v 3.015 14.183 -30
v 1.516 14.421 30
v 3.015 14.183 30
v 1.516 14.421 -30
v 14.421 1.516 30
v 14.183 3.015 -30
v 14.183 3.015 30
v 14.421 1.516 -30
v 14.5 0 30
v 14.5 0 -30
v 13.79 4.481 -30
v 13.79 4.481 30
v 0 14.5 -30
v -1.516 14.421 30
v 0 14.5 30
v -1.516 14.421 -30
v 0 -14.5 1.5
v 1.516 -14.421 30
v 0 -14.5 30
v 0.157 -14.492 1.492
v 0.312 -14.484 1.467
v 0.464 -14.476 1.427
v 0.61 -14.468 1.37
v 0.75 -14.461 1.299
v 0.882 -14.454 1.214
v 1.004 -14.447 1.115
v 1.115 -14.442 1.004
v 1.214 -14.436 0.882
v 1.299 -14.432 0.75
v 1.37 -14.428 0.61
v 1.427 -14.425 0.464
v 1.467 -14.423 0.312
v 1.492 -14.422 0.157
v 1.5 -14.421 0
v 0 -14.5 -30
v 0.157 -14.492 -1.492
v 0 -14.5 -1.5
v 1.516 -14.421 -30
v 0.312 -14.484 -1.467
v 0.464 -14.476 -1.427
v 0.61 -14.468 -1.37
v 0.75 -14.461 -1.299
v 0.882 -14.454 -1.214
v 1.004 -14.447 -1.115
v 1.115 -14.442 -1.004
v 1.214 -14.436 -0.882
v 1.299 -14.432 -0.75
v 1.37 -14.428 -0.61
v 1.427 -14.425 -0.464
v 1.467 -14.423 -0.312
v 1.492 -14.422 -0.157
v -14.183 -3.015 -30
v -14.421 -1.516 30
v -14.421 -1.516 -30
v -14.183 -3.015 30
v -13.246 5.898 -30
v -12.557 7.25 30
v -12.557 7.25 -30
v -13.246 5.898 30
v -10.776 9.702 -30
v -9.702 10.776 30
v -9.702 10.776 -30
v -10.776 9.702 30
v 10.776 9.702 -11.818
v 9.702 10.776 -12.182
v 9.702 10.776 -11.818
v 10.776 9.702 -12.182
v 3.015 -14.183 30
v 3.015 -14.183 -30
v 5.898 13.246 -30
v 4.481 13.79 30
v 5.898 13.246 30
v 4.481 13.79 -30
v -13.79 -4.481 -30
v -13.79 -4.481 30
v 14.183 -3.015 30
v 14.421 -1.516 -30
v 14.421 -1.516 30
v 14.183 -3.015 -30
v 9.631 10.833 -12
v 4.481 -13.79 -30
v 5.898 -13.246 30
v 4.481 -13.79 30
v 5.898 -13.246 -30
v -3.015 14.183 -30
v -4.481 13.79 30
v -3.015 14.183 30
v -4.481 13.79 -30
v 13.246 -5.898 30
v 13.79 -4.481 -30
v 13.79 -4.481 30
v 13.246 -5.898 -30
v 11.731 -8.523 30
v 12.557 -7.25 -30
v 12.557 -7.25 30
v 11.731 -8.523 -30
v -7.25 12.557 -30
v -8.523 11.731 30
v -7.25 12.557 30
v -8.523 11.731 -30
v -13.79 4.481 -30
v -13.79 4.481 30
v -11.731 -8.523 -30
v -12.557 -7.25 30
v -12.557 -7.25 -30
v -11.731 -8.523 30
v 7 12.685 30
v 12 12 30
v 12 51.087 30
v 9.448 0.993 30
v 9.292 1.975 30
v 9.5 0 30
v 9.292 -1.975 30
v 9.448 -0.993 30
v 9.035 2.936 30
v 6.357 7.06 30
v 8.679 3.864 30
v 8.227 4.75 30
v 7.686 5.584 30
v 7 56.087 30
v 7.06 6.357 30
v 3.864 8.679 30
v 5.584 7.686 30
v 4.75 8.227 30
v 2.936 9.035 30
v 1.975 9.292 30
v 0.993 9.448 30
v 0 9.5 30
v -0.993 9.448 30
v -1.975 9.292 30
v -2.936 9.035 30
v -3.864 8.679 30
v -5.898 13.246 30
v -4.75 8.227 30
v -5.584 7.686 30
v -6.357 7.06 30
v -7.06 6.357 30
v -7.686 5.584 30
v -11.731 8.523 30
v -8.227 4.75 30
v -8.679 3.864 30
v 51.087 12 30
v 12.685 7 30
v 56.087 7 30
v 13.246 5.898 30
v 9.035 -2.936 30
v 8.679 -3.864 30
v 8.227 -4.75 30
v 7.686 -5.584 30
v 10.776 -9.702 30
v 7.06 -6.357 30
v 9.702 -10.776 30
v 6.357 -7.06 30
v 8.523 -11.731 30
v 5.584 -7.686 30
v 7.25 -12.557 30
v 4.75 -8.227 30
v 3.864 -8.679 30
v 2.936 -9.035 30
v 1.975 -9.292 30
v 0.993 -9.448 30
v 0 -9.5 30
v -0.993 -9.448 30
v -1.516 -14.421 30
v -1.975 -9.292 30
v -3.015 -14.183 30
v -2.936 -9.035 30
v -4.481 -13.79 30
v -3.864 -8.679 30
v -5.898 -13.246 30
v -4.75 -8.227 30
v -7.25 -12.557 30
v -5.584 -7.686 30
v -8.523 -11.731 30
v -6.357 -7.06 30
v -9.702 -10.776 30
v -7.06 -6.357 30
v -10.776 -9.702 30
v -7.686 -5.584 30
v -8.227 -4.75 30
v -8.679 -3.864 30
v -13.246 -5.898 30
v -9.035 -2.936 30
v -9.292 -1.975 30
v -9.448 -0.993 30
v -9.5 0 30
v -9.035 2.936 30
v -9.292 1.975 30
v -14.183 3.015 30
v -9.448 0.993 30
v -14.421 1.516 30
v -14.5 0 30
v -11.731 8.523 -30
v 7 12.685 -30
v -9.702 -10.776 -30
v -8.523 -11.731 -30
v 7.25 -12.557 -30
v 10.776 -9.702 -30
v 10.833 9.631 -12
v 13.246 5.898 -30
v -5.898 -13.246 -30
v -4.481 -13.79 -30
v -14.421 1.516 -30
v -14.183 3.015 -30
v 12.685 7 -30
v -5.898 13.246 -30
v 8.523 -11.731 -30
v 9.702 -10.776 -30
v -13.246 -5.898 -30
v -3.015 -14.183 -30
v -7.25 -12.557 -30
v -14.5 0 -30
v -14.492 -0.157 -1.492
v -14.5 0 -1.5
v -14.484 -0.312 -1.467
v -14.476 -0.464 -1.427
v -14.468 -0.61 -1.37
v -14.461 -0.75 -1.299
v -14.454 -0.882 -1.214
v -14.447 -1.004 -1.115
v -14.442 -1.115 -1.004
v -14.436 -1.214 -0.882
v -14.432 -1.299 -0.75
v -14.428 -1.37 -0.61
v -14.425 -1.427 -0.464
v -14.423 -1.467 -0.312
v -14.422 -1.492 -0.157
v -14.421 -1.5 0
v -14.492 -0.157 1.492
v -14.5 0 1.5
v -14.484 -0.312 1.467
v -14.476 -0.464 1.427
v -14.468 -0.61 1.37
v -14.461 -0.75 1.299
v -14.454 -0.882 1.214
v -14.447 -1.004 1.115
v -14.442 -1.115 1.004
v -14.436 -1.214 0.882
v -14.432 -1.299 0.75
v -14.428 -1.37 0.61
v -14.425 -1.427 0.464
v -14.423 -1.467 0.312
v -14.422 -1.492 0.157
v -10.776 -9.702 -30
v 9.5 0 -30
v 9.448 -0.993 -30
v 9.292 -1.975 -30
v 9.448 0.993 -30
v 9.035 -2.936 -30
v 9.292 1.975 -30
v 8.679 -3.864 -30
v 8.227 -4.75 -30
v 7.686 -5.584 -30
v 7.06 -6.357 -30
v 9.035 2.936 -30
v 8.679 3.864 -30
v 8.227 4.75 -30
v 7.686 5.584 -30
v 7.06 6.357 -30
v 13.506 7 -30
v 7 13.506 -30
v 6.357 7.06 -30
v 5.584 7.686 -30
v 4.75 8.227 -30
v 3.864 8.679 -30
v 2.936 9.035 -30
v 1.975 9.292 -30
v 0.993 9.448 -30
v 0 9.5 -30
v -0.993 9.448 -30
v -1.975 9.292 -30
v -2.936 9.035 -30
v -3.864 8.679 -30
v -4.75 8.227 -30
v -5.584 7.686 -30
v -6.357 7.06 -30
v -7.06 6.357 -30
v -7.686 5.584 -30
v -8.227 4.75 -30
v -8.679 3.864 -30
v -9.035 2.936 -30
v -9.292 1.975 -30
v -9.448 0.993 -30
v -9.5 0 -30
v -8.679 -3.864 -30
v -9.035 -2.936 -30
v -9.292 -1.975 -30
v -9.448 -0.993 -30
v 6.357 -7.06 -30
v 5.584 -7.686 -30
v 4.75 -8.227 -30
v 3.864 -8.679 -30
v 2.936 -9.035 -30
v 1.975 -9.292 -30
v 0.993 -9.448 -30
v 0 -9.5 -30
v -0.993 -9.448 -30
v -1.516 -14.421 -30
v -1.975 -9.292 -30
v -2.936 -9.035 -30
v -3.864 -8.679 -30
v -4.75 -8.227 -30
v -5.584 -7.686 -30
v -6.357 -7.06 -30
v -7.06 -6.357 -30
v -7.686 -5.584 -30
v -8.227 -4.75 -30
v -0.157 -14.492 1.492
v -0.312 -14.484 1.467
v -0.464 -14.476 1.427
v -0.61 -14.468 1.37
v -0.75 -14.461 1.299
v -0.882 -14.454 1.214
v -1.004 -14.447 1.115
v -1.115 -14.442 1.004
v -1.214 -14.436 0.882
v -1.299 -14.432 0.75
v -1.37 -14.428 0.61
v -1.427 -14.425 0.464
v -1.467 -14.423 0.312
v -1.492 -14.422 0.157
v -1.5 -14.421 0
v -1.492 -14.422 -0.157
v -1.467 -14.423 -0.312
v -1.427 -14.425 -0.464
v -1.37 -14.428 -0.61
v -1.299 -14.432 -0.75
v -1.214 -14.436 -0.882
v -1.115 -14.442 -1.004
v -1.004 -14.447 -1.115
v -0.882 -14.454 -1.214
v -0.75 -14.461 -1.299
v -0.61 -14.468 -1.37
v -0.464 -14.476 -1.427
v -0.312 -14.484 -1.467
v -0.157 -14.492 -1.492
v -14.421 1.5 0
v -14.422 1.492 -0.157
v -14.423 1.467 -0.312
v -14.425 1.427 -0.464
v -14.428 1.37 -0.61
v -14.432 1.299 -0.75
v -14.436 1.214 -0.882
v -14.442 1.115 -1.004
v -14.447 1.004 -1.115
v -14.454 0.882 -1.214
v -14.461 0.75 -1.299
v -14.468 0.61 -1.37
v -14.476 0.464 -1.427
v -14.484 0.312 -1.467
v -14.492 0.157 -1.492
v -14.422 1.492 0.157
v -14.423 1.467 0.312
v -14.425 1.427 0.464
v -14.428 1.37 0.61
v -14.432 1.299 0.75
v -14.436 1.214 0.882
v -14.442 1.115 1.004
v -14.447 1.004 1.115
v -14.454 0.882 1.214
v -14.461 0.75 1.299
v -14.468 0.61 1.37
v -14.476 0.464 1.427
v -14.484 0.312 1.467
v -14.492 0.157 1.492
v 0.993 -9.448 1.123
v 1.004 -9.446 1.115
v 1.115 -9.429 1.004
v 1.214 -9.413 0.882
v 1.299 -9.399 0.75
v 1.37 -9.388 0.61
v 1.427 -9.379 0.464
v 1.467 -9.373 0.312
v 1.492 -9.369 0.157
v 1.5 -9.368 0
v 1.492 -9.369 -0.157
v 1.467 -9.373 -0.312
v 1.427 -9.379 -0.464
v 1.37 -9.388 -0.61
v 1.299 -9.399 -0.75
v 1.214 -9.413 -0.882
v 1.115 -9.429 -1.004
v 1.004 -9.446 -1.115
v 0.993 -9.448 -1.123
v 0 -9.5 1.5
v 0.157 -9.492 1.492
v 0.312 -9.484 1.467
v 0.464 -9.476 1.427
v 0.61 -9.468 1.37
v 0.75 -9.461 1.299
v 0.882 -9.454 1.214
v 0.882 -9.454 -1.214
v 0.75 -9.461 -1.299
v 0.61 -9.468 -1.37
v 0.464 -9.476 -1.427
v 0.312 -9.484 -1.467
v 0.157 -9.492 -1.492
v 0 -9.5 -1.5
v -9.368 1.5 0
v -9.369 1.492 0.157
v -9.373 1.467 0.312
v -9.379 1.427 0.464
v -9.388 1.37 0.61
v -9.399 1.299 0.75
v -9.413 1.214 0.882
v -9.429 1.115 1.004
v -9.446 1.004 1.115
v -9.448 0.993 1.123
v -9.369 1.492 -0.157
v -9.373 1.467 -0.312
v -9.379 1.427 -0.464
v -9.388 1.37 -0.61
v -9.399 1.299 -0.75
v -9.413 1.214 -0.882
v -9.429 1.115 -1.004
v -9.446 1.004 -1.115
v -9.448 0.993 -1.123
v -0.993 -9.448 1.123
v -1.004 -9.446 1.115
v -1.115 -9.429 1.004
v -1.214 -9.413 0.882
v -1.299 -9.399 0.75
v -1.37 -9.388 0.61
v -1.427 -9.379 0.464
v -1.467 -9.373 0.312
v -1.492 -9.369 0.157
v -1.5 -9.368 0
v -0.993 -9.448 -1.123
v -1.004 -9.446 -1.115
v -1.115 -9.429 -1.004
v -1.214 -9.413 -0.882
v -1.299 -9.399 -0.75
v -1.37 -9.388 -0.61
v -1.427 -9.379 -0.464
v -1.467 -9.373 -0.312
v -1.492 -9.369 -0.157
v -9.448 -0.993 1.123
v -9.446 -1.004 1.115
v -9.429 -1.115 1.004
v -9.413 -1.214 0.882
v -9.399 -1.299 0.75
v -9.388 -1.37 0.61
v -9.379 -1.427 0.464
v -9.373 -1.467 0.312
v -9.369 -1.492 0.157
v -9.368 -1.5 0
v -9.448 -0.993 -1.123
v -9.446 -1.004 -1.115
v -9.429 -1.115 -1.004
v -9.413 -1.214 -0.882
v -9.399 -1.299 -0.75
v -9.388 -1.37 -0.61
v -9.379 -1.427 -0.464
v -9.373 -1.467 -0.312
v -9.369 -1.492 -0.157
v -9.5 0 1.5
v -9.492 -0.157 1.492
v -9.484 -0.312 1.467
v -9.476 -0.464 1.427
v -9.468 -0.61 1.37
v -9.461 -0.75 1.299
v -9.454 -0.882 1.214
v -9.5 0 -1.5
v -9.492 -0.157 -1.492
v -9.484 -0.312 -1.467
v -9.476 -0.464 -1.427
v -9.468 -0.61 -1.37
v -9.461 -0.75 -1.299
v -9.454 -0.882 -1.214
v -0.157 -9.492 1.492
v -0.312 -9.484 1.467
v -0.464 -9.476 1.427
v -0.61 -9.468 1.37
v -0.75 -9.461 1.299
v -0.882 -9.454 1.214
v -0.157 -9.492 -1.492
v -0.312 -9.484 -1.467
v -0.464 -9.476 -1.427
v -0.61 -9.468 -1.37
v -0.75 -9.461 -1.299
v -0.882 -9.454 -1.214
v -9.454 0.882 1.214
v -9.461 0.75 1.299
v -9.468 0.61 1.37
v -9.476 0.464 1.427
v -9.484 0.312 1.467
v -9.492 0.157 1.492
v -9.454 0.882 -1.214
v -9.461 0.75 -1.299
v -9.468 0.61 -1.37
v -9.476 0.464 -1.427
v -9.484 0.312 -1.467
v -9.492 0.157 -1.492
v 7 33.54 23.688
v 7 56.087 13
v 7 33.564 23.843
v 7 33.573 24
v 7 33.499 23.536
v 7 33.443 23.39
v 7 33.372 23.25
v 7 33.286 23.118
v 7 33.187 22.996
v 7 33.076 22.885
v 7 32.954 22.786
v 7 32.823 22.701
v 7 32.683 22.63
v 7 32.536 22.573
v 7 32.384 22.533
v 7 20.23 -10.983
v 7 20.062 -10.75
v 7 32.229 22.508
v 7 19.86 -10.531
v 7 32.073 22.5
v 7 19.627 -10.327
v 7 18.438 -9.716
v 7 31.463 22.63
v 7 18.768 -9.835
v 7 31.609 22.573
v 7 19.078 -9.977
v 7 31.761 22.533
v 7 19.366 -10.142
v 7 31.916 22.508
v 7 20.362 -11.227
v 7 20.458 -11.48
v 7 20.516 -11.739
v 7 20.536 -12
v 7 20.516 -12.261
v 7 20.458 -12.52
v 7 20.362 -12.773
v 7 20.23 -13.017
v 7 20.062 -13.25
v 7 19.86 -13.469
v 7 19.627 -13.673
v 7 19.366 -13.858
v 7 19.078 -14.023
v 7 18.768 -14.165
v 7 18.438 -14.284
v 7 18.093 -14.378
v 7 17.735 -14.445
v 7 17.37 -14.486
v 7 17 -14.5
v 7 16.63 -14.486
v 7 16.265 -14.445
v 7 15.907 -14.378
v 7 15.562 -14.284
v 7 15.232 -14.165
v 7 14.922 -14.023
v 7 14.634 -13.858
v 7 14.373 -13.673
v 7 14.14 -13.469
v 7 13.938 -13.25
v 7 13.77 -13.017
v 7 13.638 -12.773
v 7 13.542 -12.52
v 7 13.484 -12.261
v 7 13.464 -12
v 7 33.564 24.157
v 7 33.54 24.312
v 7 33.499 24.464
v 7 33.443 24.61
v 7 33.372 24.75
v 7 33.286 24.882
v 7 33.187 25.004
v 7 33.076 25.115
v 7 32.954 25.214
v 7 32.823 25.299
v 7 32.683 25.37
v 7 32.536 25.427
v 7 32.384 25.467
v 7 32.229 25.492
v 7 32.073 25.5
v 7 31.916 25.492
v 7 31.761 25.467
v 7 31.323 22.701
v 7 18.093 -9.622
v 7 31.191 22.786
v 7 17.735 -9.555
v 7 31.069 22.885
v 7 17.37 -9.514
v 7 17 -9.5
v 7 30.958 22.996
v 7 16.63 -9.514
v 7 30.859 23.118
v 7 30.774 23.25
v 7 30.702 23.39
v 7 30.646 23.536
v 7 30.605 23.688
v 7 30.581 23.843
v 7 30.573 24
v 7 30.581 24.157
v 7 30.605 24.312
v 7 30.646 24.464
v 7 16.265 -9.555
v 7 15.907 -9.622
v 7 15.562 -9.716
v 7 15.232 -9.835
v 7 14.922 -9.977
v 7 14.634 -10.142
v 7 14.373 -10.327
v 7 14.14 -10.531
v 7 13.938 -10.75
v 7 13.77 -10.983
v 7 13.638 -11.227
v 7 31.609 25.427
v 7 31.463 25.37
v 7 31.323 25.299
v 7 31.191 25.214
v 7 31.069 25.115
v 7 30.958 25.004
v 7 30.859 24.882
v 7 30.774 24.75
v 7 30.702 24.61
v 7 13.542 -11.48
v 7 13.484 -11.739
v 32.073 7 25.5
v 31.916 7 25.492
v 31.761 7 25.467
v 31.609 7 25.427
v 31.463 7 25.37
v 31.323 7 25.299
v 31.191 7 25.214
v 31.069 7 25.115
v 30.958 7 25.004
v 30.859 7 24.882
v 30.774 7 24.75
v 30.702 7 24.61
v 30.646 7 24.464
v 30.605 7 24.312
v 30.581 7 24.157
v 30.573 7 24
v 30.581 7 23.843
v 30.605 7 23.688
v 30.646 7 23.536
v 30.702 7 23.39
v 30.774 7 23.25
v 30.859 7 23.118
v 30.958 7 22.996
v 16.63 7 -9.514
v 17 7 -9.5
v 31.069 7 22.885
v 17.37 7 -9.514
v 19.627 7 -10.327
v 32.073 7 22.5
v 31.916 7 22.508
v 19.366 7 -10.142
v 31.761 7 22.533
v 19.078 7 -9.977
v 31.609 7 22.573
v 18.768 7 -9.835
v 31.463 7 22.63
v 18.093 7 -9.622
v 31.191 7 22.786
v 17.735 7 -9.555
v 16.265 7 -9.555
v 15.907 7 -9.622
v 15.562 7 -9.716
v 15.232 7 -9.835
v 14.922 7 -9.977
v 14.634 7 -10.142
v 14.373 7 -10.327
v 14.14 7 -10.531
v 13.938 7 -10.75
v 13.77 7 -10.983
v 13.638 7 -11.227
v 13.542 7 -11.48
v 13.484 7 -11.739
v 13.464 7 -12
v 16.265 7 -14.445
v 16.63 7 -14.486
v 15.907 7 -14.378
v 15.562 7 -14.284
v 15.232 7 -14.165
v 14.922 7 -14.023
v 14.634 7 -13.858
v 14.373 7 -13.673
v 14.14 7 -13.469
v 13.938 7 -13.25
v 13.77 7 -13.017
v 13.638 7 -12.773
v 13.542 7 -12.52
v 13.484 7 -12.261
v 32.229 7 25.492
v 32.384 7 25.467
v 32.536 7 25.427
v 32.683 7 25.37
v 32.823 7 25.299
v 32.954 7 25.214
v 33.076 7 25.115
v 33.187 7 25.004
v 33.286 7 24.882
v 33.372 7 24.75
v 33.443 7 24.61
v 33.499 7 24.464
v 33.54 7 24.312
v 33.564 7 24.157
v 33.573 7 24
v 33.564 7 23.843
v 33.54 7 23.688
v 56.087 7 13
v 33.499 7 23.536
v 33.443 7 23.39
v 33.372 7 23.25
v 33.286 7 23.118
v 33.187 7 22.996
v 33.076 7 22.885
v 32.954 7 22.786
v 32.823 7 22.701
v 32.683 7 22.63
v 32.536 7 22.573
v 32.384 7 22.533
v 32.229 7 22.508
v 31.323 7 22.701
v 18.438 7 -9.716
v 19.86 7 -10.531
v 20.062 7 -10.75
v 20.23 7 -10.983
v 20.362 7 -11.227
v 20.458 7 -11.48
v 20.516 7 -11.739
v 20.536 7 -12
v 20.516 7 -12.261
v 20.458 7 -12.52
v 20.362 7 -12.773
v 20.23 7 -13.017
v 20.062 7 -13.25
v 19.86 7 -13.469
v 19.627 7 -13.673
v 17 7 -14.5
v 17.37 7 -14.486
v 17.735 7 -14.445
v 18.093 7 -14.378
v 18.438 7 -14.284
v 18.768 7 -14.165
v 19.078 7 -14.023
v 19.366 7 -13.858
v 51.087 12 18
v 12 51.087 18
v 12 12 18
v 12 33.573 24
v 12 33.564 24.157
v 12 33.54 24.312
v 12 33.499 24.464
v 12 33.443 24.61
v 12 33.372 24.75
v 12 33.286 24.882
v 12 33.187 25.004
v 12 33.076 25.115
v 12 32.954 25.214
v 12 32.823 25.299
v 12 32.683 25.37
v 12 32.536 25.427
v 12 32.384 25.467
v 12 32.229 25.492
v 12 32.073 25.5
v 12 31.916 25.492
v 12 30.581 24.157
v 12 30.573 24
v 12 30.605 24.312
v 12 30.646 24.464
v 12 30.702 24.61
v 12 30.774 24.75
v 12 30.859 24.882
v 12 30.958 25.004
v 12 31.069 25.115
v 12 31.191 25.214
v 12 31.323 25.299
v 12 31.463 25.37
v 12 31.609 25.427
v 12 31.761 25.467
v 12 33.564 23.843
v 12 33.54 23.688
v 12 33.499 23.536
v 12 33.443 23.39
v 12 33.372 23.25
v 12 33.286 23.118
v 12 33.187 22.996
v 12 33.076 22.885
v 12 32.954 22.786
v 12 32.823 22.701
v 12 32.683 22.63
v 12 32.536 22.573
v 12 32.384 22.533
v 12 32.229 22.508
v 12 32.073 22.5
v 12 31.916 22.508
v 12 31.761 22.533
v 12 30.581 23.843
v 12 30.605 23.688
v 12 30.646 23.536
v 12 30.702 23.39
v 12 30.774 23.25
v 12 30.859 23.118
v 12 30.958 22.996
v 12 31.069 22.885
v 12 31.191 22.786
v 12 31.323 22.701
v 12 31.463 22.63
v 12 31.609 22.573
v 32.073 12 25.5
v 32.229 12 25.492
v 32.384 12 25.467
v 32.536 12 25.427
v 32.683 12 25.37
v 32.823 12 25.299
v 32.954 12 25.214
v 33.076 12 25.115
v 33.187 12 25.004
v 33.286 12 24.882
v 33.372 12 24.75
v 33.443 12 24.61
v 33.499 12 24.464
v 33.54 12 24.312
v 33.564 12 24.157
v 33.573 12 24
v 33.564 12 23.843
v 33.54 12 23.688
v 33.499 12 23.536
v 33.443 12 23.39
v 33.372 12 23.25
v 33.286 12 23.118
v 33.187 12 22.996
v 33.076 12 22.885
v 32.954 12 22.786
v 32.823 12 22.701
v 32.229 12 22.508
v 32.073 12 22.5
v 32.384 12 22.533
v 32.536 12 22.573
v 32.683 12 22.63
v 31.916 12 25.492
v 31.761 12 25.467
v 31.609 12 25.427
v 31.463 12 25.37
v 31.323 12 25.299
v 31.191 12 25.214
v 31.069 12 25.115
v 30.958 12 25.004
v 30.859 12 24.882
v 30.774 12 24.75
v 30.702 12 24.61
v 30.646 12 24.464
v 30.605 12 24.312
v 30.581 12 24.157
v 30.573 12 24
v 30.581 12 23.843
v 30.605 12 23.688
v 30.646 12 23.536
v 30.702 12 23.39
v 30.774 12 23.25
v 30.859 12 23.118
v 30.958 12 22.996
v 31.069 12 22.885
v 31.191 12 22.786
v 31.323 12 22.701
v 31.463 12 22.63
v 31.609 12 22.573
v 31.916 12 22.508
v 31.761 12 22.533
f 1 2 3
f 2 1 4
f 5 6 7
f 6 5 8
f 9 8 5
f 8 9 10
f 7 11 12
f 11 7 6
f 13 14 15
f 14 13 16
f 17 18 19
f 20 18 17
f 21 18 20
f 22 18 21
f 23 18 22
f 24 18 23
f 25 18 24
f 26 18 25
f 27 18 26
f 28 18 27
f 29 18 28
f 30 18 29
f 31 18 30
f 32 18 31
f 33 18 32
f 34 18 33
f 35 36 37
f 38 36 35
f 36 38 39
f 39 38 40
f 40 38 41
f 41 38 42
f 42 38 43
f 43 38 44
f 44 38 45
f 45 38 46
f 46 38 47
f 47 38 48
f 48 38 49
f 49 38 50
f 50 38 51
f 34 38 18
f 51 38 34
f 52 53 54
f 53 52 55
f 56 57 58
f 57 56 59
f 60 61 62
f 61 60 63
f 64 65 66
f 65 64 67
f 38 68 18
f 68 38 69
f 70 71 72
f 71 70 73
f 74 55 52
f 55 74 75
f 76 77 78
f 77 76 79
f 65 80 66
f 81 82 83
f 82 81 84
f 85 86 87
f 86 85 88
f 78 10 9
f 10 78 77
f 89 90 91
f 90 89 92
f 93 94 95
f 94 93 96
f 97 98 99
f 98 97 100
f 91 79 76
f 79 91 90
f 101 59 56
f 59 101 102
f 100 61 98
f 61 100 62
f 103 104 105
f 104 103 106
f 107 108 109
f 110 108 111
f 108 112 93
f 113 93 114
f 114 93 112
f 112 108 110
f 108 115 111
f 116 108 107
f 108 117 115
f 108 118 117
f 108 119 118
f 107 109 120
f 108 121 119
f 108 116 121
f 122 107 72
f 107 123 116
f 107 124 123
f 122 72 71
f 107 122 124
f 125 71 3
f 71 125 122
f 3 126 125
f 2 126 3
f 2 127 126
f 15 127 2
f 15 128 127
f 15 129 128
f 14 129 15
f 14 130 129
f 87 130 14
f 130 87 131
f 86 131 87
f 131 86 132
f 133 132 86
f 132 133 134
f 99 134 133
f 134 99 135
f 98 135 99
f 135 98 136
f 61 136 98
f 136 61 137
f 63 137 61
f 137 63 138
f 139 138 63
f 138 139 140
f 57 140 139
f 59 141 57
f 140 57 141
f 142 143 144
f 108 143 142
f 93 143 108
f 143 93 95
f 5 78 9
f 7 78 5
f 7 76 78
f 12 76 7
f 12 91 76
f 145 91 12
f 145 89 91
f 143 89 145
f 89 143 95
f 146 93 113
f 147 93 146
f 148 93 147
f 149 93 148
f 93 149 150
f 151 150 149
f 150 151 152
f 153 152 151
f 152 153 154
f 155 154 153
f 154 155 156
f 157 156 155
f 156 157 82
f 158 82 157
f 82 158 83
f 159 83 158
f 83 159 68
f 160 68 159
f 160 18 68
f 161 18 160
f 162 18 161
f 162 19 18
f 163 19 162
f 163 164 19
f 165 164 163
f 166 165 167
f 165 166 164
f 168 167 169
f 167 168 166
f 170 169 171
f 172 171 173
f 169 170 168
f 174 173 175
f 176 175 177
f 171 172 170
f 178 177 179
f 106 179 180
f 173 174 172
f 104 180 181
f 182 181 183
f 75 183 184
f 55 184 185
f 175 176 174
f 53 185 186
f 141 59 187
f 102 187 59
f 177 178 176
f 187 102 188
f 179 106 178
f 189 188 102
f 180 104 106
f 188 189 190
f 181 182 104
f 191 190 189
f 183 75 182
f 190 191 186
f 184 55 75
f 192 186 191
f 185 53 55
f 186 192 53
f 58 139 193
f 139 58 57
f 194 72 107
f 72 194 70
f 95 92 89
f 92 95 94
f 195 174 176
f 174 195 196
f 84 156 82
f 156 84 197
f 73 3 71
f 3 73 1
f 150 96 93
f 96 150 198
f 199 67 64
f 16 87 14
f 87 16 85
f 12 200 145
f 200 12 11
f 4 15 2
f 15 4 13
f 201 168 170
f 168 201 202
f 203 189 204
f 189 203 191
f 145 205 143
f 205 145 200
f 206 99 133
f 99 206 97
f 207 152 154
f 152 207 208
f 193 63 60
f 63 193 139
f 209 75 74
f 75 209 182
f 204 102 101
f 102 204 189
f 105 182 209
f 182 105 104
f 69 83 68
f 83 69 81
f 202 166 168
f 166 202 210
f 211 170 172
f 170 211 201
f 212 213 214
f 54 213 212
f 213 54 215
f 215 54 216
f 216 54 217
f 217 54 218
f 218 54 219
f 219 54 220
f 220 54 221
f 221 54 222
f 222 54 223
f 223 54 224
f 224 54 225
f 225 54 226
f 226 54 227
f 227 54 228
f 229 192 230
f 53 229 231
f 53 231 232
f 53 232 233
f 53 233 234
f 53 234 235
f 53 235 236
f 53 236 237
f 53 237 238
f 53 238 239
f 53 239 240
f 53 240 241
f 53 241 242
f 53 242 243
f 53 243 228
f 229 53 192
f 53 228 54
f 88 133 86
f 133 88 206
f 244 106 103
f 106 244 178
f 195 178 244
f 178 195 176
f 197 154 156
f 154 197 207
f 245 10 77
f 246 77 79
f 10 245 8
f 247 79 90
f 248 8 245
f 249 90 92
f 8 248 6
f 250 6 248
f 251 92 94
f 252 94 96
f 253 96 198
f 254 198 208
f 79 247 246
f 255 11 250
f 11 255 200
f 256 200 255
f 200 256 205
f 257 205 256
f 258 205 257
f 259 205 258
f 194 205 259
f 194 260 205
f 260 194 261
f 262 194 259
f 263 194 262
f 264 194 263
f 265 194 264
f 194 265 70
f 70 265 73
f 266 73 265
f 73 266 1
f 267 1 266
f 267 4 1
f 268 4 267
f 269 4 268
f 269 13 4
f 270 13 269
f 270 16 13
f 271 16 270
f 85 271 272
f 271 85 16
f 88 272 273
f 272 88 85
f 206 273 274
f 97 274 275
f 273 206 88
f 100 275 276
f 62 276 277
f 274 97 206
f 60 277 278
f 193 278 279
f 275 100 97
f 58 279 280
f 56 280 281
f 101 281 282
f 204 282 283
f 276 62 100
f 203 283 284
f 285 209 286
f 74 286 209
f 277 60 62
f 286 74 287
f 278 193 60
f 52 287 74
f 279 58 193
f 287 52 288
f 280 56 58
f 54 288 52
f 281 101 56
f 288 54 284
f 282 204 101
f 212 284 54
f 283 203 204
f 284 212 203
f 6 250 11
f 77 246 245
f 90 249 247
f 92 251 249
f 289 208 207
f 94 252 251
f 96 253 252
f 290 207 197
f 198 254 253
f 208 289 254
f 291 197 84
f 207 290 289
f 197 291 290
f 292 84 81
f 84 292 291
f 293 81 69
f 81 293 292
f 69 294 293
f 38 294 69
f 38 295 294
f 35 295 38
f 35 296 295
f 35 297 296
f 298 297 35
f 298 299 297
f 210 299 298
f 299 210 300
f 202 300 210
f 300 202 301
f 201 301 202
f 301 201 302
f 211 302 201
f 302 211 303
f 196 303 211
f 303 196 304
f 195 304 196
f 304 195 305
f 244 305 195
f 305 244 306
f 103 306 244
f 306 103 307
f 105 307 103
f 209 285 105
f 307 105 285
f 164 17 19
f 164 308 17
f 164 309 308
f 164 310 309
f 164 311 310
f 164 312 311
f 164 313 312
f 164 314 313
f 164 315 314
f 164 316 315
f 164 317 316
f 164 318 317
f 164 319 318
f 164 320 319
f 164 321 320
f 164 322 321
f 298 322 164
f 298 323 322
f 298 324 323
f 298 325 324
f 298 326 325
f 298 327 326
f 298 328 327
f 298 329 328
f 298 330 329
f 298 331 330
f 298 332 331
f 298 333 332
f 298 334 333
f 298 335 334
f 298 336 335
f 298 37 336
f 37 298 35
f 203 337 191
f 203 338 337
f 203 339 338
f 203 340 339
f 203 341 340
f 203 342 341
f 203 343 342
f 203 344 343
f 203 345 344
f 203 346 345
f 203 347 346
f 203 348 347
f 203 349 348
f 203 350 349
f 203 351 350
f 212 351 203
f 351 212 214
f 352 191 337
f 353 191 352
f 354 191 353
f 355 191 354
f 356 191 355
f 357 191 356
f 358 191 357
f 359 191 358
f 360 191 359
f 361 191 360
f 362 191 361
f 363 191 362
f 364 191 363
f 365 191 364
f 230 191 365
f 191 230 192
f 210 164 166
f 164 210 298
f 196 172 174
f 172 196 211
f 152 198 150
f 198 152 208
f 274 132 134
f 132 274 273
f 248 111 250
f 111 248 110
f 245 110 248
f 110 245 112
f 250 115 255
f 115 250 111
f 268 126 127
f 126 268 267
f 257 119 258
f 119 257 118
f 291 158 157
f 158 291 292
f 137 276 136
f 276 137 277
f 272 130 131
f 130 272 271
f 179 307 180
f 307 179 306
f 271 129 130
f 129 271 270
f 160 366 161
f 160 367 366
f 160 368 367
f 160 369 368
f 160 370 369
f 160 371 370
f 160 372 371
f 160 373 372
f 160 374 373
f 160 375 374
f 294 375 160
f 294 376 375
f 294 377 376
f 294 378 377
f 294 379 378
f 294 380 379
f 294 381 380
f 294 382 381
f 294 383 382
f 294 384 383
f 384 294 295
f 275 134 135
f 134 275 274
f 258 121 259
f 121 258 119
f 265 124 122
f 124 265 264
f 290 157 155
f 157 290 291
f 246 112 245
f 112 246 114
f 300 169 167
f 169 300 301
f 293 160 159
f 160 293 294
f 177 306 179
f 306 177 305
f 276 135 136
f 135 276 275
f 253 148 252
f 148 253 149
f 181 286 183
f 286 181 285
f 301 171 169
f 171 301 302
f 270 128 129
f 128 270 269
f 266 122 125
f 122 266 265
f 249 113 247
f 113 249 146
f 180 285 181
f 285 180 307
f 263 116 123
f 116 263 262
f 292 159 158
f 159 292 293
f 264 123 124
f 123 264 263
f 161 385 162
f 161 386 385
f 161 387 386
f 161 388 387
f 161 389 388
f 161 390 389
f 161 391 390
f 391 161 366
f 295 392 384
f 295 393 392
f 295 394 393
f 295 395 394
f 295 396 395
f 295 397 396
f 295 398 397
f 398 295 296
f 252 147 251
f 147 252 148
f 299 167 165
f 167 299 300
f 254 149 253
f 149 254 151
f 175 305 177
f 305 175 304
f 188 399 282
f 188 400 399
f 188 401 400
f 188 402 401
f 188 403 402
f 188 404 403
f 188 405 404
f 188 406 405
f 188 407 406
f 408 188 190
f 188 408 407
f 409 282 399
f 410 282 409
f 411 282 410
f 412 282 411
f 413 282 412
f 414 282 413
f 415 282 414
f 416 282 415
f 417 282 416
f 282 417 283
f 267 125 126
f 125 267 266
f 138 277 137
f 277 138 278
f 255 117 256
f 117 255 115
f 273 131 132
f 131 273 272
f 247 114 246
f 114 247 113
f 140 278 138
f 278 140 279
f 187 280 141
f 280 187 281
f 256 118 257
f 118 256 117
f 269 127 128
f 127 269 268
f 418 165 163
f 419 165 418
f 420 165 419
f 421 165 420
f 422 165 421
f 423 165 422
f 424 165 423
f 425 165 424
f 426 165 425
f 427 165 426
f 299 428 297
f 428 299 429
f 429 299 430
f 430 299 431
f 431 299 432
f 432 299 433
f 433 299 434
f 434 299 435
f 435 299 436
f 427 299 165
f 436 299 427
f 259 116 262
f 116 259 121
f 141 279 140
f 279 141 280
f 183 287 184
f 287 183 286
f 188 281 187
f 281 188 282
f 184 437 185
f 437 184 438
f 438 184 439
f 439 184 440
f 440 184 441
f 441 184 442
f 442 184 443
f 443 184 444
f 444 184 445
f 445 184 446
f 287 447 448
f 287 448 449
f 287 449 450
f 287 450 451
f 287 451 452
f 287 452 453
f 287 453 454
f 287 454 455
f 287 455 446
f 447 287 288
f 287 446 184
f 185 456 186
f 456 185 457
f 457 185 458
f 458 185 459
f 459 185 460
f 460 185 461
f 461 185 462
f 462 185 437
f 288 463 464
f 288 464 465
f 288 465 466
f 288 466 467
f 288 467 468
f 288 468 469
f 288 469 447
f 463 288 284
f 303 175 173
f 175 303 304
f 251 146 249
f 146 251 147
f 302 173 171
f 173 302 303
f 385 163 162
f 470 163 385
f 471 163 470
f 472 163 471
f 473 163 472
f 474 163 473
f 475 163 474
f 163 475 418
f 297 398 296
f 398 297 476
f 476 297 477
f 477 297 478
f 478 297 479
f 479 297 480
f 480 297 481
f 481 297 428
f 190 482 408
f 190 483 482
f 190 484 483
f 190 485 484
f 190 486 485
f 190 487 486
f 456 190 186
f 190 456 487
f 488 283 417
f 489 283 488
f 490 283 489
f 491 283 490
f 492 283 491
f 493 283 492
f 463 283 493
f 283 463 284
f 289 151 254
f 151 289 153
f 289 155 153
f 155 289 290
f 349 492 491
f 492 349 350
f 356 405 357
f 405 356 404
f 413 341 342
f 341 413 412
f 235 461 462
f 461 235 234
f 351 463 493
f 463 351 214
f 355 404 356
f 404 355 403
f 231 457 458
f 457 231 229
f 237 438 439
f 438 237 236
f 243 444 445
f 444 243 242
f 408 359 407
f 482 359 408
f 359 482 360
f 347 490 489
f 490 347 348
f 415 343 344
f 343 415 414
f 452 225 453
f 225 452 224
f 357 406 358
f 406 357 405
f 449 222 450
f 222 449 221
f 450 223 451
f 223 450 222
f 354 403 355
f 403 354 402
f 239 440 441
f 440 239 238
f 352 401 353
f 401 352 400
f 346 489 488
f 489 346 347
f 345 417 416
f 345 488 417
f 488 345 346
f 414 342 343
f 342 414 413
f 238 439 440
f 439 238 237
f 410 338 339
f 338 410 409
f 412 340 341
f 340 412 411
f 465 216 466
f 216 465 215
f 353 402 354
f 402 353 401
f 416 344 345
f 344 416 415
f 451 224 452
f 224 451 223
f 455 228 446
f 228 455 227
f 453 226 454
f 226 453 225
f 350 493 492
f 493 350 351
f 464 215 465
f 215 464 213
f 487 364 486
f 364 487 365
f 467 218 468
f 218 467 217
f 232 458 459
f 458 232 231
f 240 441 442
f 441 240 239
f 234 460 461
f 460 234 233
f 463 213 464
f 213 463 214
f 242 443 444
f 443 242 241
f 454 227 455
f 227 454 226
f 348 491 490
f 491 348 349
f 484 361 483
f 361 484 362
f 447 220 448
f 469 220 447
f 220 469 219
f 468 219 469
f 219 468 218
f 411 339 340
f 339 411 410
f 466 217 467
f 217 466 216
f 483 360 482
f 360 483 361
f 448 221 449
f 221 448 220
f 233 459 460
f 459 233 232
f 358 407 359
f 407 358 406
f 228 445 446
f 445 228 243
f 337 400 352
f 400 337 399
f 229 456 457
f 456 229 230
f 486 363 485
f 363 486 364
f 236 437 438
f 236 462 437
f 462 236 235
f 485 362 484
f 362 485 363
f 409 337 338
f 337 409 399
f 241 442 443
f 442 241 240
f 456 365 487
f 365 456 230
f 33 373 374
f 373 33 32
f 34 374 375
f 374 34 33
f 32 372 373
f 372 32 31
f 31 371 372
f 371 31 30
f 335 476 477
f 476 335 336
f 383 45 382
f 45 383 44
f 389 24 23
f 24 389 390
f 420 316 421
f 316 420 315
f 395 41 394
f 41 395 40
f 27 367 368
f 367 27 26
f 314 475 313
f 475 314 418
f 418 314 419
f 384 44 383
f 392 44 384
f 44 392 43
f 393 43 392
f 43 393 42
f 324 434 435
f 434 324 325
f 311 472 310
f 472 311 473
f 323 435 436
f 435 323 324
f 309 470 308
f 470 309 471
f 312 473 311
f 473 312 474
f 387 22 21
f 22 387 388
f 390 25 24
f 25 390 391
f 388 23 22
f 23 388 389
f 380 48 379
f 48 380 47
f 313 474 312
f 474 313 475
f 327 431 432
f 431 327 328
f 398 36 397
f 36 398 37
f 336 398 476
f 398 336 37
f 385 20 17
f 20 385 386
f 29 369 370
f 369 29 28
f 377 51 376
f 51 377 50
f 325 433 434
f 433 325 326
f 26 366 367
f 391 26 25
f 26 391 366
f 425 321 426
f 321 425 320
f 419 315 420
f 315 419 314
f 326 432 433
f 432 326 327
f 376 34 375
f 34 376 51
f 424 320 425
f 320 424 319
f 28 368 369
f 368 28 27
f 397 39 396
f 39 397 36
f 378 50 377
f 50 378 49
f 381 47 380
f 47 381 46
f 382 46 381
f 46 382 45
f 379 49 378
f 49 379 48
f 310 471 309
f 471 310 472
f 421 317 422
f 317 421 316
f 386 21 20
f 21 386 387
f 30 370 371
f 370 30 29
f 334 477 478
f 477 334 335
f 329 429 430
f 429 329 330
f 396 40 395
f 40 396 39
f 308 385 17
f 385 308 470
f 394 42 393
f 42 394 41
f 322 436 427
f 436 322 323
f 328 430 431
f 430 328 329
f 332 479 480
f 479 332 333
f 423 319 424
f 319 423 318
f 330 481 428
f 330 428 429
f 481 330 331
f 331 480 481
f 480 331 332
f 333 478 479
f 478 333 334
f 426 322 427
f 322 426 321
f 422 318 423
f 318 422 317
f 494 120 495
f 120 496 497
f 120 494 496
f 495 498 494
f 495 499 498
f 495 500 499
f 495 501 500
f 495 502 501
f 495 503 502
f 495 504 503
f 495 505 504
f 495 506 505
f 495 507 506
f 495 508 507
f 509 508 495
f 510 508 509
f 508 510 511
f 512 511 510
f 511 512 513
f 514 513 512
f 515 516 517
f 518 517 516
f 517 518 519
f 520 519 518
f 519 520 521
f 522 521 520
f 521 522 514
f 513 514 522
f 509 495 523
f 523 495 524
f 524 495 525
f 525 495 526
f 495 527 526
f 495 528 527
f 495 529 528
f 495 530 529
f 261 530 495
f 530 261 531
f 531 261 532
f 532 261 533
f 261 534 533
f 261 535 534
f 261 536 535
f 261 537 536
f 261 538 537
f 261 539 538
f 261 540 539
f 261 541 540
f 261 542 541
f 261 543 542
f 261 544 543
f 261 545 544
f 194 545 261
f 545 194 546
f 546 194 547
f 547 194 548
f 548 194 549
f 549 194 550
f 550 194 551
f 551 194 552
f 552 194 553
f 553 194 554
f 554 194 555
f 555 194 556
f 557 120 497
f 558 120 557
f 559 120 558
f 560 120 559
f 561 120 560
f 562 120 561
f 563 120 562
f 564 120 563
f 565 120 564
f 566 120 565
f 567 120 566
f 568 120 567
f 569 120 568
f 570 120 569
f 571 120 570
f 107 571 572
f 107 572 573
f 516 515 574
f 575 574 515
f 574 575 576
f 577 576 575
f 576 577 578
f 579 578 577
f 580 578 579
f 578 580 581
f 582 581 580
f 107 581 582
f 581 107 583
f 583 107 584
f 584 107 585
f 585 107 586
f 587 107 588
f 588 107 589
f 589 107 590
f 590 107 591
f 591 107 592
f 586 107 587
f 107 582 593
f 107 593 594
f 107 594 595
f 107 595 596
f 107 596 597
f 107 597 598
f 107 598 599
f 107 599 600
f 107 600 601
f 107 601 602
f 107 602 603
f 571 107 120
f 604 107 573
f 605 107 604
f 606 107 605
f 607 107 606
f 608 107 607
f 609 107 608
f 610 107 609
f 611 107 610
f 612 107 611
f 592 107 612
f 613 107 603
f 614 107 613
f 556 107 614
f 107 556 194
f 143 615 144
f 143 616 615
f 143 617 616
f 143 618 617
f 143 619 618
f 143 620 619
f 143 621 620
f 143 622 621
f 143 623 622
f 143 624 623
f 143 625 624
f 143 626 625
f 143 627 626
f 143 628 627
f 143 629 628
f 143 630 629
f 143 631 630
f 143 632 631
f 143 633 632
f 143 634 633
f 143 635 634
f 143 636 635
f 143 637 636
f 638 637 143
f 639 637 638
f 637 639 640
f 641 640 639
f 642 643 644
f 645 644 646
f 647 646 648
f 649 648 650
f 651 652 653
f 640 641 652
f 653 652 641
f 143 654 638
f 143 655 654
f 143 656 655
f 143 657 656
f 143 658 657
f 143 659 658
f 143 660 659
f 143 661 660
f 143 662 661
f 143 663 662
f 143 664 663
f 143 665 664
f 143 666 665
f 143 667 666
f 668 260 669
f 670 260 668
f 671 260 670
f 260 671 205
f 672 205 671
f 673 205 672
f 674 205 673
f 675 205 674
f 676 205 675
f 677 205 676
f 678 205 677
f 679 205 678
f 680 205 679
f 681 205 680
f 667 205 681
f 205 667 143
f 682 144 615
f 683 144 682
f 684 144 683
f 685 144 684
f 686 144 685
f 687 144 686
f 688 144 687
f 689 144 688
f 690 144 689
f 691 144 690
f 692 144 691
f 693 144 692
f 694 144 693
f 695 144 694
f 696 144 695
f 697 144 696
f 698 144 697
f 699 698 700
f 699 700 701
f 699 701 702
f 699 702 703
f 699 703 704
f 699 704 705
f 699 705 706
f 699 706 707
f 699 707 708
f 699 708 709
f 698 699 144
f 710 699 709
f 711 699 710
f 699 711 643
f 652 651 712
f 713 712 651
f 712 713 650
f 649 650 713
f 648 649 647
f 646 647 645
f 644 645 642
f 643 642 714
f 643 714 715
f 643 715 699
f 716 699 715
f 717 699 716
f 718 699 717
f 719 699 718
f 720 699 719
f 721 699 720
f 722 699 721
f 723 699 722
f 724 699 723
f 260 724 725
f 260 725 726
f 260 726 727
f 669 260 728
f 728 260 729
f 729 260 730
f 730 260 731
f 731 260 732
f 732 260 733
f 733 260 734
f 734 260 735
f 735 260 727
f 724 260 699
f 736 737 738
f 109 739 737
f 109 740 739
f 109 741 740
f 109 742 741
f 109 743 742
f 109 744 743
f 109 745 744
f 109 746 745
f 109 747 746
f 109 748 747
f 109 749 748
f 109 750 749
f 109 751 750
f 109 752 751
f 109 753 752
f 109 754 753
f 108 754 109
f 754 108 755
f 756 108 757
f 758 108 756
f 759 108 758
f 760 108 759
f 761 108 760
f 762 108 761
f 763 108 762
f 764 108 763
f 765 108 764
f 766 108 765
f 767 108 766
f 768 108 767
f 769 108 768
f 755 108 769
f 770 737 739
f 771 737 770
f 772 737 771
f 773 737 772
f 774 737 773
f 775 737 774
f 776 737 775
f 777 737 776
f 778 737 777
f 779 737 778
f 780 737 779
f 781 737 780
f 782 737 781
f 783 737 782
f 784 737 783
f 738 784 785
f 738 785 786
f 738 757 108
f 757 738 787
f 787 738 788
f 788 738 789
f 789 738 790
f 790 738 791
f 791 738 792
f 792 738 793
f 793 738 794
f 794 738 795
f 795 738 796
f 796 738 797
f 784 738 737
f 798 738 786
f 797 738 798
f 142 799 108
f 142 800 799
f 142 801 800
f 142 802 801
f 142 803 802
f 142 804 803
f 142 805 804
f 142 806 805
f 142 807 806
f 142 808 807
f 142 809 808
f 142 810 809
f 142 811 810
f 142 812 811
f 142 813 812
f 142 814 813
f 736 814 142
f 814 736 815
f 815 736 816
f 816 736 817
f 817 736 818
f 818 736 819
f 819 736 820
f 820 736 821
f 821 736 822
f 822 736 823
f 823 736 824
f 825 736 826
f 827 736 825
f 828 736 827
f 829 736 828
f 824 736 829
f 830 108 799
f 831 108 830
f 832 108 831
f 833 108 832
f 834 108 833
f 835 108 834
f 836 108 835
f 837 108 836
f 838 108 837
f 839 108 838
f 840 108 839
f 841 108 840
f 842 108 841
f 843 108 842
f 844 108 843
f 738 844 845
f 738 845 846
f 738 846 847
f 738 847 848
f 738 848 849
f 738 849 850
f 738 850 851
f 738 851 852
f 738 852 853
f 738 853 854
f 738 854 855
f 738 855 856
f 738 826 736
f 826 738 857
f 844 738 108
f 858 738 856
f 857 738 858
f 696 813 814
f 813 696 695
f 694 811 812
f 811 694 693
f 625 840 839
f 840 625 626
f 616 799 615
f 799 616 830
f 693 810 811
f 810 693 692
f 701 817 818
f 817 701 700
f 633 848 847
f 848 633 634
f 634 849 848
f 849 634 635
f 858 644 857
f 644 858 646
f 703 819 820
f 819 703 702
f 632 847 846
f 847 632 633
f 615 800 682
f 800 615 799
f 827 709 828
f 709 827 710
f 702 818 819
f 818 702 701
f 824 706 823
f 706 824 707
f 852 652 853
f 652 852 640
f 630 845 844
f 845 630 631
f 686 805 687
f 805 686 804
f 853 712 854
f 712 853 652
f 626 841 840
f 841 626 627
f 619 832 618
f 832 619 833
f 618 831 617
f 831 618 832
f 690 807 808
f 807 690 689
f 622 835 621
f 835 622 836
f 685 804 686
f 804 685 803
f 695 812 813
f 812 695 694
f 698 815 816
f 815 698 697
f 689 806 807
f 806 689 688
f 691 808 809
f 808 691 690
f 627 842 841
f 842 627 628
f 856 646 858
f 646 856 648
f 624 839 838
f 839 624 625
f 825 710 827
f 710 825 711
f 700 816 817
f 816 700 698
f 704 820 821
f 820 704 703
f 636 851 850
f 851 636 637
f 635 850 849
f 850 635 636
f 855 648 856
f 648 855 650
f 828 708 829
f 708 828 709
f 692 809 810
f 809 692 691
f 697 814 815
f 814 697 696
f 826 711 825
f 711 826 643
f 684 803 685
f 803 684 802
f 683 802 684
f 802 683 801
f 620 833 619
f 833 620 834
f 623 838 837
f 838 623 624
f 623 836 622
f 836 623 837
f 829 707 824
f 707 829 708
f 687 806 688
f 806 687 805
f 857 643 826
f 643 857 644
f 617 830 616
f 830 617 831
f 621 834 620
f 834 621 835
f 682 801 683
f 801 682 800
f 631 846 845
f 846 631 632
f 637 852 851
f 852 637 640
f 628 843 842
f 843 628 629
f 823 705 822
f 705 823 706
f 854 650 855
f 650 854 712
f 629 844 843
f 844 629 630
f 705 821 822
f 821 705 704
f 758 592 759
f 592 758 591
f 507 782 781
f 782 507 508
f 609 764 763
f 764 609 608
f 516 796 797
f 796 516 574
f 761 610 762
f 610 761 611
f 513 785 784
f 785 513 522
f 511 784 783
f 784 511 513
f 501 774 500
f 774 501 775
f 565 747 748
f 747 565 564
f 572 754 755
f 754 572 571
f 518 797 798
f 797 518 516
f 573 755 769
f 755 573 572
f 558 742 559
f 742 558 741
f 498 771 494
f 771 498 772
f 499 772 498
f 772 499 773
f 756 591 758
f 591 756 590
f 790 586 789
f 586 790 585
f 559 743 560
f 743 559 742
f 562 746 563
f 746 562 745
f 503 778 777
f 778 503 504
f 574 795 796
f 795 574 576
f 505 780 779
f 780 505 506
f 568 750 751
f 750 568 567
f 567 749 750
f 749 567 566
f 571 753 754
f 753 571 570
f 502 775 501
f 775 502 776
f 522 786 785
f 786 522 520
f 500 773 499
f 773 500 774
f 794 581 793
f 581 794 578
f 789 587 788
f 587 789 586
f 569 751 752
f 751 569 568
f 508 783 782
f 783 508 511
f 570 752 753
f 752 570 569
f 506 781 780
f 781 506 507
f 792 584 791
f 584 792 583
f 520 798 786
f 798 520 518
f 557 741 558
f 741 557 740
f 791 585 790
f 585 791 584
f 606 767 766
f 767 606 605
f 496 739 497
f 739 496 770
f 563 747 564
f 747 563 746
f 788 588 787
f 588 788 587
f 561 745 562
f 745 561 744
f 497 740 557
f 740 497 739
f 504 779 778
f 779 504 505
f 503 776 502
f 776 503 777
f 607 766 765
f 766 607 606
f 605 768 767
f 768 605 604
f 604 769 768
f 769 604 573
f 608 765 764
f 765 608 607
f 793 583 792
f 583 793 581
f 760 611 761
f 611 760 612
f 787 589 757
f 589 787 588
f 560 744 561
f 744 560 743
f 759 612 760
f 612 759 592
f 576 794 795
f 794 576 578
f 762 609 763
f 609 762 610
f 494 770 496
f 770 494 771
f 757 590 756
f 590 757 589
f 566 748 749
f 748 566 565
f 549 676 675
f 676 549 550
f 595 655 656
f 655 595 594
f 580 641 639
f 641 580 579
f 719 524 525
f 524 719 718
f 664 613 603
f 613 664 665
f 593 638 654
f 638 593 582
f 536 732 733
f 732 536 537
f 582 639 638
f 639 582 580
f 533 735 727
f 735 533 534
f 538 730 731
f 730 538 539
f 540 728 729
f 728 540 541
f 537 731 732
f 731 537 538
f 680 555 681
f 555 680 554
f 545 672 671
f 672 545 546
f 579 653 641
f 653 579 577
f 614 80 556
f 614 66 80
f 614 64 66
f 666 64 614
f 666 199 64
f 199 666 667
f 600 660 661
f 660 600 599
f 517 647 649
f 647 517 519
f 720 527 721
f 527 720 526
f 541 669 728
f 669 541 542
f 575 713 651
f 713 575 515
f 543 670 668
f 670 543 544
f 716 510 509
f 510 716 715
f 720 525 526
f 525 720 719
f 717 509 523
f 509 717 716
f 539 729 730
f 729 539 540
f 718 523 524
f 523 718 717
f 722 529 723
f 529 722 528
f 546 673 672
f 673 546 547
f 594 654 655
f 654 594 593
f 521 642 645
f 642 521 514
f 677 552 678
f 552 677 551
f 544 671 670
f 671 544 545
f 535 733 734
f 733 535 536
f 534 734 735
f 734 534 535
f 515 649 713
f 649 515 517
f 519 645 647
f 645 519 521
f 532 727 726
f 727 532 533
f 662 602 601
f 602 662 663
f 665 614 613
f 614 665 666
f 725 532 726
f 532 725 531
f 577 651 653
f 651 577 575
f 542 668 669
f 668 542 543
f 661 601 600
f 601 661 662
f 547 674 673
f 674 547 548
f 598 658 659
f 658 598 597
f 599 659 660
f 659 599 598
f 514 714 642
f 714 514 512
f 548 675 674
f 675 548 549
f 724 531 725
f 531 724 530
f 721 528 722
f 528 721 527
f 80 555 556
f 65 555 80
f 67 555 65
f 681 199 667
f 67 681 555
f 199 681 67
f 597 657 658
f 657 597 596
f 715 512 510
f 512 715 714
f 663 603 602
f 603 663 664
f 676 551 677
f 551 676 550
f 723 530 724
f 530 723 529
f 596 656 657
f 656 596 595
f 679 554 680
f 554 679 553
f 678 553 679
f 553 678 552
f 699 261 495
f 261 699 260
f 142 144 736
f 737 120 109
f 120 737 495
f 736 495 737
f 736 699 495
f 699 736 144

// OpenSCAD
// The OD of the tube about which the bracket will be secured
tube_diameter=19;

// The thickness of the shelf
shelf_thickness=12;

// Diameter of the screw holes for securing the tube and the shelf
screw_hole_diameter=3;

// Diameter of the hole at the bottom of the bracket, to be used for torsional reinforcement.
wire_hole_diameter=5;

// The thickness of the walls of the bracket
wall_thickness=5;

// Total height of the printed bracket
bracket_height=60;

// Angle at which the bracket extends to support the shelf. (A larger angle may require supports to print)
support_angle=35;

/* [Hidden] */
fudge=1;

adj_len=bracket_height - shelf_thickness - wall_thickness;
op_len = adj_len * tan(support_angle);

$fn=60;

difference() {
 cylinder(bracket_height, d=tube_diameter + (wall_thickness * 2), center=true); 
 cylinder(bracket_height + fudge, d=tube_diameter, center=true);
 translate([0 - (tube_diameter / 2) - (wall_thickness / 2), 0, 0])
   rotate([0, 90, 0])
     cylinder(wall_thickness + fudge, d=screw_hole_diameter, center=true);
 translate([0, 0 - (tube_diameter / 2) - (wall_thickness / 2), 0])
   rotate([90, 0, 0])
     cylinder(wall_thickness + fudge, d=screw_hole_diameter, center=true);
}


difference() {
    
  translate([(bracket_height / 2) + (tube_diameter / 2) - (wall_thickness / 2),
          (bracket_height / 2) + (tube_diameter / 2) - (wall_thickness / 2), 0]) 
    difference() {
      cube([bracket_height, bracket_height, bracket_height], center=true);
      translate([wall_thickness, wall_thickness, bracket_height - shelf_thickness])
        cube(bracket_height, center=true);
      translate([0 - (bracket_height / 2) + (op_len / 1.5) + wall_thickness,
                   0 - (bracket_height / 2) + ((wall_thickness + fudge / 2) / 2),
                   (bracket_height / 2) - (shelf_thickness / 2)])
           rotate([90, 0, 0])
             cylinder(wall_thickness + fudge, d=screw_hole_diameter, center=true);
      translate([0 - (bracket_height / 2) + ((wall_thickness + fudge / 2) / 2),
                  0 - (bracket_height / 2) + (op_len / 1.5) + wall_thickness,
                 (bracket_height / 2) - (shelf_thickness / 2)])
           rotate([0, 90, 0])
             cylinder(wall_thickness + fudge, d=screw_hole_diameter, center=true);
      translate([0 - (bracket_height / 2)  + (wire_hole_diameter),
                  0 - (bracket_height / 2)  + (wire_hole_diameter),
                 0 - (bracket_height / 5)])
           rotate([45, 90, 0])
             cylinder(tube_diameter * 2, d=wire_hole_diameter, center=true);
    }

  rotate([0,0,45])
    translate([(bracket_height / 2) + (tube_diameter / 2) + (wall_thickness),
         0, 0 - (bracket_height / 2)])
      translate([0 - bracket_height / 2, 0, 0]) 
        rotate([0, support_angle, 0])
          translate([bracket_height / 2, 0, 0])
            cube([bracket_height, bracket_height * 2, bracket_height * 3], center=true);

  rotate([0, 0, 45])
    translate([(bracket_height / 2) + (tube_diameter / 2) + wall_thickness + op_len,
          0, 0]) 
      cube([bracket_height, bracket_height * 2, bracket_height * 2], center=true); 
}
